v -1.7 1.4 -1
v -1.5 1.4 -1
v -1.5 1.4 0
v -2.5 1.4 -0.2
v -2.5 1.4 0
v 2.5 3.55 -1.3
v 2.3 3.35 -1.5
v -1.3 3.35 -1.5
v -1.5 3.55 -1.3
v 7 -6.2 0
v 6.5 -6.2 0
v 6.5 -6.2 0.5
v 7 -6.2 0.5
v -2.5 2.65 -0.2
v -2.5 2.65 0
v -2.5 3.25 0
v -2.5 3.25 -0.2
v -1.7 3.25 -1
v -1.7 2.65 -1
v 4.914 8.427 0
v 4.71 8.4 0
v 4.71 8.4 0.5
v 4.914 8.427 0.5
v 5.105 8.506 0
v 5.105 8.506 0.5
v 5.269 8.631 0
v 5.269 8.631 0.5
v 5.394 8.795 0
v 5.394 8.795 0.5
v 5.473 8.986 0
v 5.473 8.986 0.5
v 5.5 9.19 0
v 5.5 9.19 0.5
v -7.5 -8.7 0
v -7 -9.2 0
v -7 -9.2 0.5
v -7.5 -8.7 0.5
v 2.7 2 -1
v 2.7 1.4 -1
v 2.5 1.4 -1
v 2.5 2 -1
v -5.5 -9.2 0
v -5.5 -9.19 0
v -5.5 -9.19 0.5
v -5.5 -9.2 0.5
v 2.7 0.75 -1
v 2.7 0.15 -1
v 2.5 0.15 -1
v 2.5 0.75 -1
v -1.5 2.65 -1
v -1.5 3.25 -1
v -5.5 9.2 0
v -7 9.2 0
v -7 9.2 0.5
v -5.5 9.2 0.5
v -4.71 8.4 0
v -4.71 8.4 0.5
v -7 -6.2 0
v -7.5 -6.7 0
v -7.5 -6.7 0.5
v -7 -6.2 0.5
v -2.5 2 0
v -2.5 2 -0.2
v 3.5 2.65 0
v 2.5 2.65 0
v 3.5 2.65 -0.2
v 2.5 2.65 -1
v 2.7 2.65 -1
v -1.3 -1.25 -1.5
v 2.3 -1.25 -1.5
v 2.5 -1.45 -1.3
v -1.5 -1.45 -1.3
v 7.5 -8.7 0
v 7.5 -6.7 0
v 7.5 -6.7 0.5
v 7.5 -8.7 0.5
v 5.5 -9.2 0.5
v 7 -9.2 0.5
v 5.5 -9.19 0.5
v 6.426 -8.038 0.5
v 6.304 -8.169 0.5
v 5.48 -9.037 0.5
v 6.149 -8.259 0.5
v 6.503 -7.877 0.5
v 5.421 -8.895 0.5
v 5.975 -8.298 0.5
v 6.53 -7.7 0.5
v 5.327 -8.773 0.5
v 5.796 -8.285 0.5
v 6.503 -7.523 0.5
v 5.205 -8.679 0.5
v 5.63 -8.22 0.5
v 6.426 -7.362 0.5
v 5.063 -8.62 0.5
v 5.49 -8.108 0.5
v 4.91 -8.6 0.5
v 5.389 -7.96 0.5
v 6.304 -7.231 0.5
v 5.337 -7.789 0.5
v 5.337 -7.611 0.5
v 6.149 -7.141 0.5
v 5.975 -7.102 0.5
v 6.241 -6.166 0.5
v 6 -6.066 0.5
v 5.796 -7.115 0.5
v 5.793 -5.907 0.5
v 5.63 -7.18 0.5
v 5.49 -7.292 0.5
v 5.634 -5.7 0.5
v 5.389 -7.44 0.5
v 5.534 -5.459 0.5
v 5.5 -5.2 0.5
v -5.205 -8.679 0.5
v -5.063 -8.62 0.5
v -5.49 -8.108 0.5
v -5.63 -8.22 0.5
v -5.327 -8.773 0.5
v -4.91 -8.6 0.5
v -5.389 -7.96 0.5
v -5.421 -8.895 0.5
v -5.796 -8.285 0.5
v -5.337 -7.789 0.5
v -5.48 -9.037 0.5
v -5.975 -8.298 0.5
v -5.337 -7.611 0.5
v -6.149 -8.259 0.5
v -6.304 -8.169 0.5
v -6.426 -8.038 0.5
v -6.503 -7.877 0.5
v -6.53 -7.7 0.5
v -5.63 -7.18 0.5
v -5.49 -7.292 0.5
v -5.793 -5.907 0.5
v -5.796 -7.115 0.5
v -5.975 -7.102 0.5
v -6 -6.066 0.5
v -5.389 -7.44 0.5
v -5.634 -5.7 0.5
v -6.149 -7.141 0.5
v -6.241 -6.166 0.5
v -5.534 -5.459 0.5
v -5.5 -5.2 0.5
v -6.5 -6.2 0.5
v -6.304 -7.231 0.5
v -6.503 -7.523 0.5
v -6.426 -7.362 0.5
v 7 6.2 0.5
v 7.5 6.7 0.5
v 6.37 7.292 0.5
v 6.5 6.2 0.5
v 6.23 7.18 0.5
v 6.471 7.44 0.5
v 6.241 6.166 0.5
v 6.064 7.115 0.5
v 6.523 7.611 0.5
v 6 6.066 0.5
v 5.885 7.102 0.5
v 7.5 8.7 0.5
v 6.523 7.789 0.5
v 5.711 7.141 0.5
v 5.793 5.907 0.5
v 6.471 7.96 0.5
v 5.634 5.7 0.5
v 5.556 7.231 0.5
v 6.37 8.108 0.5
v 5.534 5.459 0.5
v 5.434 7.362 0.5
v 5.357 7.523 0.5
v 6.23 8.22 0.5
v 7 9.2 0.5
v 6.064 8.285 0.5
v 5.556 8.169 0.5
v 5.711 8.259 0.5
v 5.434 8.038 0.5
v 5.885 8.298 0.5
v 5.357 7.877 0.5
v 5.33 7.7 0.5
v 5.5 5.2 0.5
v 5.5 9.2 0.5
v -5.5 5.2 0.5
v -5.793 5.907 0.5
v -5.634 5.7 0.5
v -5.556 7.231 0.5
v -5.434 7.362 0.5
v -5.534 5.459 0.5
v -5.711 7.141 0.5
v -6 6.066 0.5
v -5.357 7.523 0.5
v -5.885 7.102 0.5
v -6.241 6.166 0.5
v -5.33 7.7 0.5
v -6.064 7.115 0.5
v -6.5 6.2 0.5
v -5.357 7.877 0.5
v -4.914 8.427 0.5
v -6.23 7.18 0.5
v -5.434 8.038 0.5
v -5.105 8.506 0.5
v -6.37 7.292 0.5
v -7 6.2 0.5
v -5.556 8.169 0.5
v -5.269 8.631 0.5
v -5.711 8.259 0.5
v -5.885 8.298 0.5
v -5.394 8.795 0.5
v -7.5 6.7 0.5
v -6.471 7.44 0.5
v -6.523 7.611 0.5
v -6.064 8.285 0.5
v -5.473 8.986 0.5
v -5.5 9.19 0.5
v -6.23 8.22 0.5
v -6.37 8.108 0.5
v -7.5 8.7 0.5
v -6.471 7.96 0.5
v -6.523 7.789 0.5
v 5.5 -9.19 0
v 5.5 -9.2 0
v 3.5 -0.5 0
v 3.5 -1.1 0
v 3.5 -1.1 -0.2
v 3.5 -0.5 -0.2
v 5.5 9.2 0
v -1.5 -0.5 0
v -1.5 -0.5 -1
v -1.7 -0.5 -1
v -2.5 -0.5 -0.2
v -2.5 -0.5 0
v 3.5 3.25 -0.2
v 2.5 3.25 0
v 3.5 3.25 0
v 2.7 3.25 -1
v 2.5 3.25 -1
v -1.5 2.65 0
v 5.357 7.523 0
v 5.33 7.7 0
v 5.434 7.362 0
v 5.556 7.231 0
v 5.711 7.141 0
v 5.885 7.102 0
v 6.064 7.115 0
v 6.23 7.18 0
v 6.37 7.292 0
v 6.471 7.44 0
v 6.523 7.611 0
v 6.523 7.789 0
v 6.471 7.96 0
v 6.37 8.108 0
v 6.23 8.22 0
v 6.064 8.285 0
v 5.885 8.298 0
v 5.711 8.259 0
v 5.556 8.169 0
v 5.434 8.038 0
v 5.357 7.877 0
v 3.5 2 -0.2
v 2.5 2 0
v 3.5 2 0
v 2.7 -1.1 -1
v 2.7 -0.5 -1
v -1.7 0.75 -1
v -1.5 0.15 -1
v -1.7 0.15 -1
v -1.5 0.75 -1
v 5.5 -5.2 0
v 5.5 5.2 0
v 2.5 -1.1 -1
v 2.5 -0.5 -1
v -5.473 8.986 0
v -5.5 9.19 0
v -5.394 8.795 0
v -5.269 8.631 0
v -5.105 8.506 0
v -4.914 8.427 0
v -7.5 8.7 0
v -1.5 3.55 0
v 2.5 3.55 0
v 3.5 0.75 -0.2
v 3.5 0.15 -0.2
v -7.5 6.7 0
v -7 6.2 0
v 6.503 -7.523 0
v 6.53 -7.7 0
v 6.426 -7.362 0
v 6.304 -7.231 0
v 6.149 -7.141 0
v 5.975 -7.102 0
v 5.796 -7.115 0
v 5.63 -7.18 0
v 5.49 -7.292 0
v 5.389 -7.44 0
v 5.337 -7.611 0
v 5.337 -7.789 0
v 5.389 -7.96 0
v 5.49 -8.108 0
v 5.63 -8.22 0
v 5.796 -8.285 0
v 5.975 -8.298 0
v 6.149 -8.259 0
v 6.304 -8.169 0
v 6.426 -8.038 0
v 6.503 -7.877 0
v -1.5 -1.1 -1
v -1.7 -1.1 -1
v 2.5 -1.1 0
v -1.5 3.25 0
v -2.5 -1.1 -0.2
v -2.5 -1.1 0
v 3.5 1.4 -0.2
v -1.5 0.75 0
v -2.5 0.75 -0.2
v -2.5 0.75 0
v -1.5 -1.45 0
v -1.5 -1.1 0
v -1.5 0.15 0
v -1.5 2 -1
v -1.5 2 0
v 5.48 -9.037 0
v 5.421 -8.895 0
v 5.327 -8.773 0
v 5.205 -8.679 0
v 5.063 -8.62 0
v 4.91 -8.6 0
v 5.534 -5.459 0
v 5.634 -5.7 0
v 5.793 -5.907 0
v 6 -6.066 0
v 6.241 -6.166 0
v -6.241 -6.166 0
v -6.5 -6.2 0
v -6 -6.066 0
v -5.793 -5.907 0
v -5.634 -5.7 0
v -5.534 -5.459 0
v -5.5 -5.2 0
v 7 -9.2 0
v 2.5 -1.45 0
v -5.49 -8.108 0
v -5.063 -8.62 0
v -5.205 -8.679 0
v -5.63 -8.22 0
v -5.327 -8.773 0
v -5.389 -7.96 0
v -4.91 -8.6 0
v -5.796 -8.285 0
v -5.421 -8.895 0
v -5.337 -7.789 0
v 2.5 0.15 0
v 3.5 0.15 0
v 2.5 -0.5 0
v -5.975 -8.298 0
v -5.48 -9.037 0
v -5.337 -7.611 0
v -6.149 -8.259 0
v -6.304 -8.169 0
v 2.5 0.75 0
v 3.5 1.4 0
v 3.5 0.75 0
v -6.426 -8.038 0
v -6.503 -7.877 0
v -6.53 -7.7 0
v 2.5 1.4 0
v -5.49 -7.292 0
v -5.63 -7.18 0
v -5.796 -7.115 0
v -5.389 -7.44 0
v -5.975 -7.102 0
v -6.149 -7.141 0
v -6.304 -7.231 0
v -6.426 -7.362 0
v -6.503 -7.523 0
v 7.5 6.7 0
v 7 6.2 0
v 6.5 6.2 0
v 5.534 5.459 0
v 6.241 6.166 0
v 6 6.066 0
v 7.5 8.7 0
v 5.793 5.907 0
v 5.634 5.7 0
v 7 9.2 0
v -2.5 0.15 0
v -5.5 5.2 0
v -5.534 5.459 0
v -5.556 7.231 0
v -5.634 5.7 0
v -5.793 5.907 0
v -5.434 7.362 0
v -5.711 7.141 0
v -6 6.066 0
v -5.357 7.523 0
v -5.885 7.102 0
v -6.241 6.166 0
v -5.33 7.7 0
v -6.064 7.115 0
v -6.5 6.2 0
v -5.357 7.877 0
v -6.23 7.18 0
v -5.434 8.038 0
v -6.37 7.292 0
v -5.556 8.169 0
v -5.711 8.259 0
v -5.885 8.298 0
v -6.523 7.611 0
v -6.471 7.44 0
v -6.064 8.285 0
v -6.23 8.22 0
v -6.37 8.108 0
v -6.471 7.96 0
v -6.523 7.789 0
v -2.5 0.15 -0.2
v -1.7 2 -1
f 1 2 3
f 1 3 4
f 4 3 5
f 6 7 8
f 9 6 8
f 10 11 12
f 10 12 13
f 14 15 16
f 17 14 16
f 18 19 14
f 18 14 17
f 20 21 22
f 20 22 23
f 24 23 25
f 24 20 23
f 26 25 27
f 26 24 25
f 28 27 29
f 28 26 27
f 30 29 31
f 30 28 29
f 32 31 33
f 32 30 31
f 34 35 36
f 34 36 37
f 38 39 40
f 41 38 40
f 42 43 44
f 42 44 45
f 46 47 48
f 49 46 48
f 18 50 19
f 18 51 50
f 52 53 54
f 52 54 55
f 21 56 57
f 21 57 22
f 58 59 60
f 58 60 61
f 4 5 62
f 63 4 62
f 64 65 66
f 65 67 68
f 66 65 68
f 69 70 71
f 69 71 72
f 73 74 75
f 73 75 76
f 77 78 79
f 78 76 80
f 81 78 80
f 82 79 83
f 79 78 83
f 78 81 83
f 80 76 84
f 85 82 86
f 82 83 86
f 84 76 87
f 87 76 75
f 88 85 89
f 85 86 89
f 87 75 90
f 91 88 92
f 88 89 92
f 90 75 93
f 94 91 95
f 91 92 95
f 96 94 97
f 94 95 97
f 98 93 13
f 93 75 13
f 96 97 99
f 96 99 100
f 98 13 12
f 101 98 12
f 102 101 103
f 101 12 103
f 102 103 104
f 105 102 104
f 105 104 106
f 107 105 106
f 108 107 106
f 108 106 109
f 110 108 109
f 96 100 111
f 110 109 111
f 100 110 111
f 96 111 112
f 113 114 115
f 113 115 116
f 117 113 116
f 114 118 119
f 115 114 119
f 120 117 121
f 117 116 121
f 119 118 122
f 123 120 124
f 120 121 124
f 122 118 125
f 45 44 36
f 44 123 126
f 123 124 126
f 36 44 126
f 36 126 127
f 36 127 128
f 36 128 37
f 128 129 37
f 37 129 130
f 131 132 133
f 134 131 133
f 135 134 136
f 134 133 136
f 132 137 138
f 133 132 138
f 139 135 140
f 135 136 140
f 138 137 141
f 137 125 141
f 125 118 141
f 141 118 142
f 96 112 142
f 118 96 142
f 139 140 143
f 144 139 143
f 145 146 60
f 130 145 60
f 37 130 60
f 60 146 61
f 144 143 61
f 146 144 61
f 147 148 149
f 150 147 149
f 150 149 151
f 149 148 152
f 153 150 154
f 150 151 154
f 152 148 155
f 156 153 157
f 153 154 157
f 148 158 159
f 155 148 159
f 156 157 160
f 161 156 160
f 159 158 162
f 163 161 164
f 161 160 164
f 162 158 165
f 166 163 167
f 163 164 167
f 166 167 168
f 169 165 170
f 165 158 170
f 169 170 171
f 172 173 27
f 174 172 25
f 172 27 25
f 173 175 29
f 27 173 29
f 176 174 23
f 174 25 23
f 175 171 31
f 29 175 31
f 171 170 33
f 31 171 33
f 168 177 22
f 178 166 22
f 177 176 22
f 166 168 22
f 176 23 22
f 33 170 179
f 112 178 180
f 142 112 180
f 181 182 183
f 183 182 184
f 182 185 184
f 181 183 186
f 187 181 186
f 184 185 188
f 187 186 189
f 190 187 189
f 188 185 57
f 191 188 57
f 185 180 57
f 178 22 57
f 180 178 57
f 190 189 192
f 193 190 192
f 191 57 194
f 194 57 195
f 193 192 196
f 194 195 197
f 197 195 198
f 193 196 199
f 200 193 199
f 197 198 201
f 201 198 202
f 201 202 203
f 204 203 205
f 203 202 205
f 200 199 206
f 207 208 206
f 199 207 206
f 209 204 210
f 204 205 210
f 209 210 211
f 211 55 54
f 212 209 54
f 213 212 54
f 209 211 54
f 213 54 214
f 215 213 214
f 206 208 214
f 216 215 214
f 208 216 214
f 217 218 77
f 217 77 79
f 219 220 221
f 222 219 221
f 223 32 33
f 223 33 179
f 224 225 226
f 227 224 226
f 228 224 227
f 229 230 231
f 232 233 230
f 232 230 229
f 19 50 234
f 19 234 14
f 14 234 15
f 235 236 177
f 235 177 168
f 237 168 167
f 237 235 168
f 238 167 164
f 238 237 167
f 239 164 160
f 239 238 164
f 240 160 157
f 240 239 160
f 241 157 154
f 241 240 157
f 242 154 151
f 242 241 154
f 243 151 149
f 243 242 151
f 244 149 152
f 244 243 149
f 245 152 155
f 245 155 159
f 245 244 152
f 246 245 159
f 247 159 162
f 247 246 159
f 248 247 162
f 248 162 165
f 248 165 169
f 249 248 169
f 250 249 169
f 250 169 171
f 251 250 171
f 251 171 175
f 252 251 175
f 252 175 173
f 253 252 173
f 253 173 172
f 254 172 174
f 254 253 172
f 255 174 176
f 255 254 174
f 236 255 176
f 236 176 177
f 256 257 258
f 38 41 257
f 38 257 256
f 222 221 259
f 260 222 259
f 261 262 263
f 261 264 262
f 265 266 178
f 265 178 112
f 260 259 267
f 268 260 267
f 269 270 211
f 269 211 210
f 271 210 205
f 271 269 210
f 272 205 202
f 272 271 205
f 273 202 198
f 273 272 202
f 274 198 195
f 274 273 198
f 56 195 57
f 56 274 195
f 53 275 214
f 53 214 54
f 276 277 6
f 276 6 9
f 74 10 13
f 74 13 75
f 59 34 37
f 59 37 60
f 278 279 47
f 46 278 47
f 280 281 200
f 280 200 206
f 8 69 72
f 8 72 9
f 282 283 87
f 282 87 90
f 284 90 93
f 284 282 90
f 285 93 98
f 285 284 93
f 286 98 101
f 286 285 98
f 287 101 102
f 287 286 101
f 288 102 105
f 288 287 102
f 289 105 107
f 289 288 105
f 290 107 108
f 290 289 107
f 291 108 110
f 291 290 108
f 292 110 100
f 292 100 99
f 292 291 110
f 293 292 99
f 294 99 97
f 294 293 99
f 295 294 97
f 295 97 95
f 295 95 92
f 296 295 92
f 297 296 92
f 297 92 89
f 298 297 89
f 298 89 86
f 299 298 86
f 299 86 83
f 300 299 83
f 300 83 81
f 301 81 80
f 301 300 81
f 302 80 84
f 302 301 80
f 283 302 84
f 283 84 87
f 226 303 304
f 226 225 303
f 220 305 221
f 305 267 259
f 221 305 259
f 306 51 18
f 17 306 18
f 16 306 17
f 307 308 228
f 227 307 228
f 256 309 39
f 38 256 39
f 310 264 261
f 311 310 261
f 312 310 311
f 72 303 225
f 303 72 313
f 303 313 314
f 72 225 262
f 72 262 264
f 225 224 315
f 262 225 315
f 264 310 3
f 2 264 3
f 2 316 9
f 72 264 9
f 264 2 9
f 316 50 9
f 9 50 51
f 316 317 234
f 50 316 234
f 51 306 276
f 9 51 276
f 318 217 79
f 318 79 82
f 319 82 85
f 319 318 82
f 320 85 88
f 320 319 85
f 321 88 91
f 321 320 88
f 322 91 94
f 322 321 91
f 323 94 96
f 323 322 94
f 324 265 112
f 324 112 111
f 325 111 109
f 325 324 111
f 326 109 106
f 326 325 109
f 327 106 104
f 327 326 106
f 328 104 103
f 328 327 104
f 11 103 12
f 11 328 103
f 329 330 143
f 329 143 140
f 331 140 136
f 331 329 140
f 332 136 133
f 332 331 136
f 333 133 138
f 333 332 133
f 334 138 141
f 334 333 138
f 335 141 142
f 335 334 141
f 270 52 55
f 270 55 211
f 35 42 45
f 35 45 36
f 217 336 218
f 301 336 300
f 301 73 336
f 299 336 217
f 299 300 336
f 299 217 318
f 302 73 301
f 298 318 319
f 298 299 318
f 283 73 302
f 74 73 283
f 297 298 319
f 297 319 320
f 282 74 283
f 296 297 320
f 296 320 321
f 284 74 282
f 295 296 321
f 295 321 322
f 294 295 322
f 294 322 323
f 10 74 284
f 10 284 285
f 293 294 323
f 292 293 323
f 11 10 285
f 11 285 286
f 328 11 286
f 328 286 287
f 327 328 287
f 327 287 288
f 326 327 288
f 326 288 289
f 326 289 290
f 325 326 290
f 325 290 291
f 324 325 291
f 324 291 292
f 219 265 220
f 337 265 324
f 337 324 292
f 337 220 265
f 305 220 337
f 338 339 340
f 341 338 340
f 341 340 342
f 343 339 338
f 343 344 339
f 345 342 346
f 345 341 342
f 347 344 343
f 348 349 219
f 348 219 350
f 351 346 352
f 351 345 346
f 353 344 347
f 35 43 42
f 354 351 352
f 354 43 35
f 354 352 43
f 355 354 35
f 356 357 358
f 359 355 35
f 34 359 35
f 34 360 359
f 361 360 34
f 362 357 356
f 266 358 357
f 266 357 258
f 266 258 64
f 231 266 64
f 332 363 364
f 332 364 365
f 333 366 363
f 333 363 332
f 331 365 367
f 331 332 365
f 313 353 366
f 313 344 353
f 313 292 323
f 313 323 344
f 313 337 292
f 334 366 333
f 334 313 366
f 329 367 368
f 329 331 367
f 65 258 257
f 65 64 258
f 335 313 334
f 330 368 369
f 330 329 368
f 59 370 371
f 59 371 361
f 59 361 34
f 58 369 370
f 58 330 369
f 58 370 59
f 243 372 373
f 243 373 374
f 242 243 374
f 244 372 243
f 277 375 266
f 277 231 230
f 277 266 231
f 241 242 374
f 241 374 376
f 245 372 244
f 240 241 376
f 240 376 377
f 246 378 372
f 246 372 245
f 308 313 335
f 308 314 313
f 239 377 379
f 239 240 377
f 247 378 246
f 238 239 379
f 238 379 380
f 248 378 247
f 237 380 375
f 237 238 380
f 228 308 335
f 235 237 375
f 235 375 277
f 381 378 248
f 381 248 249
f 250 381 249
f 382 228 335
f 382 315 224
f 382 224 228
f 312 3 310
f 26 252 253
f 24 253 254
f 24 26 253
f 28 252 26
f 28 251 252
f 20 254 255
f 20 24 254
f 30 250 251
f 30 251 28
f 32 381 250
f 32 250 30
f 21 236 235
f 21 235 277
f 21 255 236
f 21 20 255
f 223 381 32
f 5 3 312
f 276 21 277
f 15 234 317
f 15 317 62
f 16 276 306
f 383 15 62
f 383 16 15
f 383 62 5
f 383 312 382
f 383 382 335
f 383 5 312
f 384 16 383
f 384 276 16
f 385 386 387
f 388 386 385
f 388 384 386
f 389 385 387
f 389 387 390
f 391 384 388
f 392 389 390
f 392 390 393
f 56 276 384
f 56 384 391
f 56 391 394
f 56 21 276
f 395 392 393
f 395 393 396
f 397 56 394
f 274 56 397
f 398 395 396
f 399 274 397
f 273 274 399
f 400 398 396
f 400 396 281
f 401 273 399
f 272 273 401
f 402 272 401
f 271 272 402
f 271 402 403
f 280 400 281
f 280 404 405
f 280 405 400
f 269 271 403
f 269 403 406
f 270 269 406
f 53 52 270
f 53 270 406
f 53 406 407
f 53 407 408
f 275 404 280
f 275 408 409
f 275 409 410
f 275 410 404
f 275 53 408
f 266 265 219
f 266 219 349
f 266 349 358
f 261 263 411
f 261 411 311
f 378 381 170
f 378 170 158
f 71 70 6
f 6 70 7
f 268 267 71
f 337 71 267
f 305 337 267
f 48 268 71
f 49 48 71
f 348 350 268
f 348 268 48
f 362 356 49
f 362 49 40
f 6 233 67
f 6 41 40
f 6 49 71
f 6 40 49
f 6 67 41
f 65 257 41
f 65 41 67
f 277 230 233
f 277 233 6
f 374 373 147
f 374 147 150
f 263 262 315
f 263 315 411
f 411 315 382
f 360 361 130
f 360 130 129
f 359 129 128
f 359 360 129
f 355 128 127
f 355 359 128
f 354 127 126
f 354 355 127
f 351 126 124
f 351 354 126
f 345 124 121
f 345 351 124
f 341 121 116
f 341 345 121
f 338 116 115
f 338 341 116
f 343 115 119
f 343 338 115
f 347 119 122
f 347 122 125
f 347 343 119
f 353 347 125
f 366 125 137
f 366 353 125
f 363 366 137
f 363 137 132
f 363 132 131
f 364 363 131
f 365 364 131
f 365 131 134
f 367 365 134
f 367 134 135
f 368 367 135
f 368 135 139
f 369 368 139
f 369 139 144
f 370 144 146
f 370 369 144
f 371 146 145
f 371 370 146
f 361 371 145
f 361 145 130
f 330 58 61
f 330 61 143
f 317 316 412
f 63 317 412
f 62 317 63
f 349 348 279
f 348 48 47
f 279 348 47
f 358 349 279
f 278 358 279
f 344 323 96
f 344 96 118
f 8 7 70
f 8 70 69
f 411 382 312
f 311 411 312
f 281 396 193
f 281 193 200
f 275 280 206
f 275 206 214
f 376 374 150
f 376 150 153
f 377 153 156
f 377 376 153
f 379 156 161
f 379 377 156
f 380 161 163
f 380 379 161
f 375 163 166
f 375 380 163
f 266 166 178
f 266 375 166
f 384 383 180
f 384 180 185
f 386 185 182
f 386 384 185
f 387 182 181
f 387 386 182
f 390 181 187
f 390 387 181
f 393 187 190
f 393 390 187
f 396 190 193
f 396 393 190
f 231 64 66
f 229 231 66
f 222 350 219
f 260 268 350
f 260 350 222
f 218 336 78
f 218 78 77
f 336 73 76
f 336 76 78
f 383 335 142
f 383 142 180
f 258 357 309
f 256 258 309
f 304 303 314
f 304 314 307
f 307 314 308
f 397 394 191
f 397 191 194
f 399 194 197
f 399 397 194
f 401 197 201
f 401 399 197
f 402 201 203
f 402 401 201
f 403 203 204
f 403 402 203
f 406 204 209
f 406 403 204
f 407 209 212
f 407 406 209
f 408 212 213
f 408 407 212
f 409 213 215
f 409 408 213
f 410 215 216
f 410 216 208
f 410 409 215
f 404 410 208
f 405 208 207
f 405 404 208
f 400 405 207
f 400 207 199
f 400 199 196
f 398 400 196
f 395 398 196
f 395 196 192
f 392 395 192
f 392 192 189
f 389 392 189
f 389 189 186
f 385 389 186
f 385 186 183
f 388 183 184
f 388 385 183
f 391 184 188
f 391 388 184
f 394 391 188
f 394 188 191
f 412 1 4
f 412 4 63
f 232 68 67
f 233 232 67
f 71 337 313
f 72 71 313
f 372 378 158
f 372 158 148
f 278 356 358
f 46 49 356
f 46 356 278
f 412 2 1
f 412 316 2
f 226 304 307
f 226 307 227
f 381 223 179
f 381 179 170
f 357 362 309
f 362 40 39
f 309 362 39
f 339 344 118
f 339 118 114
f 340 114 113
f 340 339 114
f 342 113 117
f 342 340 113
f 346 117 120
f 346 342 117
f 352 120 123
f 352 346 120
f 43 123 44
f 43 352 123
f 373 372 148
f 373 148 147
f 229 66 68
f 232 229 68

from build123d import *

# Parameters (mm, degrees)
ESBO_O1_R                       = 0.6
RESSALTO_EXTRUS_O1_DEPTH        = 0.5
ESBO_O3_W                       = 4
ESBO_O3_H                       = 5
RESSALTO_EXTRUS_O2_DEPTH        = 1.5
ESBO_O4_W                       = 1
ESBO_O4_H                       = 0.6
RESSALTO_EXTRUS_O3_DEPTH        = 1
CHANFRO1_SIZE                   = 0.8
PADR_O_LINEAR1_COUNT            = 4
PADR_O_LINEAR1_PITCH            = 1.25
CHANFRO1_OF_PADR_O_LINEAR1_SIZE = 0.8
ESPELHAR1_START                 = -1.1
ESPELHAR1_DEPTH                 = 0.6
ESPELHAR1_START_2               = 0.15
ESPELHAR1_2_DEPTH               = 0.6
ESPELHAR1_START_3               = 1.4
ESPELHAR1_3_DEPTH               = 0.6
ESPELHAR1_START_4               = 2.65
ESPELHAR1_4_DEPTH               = 0.6
CHANFRO2_SIZE                   = 0.2


# Read off the part's stored shape, not the designer's step: Espelhar1
with BuildPart() as part:
    # Esboço1 → Ressalto-extrusão1 (new body)
    with BuildSketch(Plane.XY):
        with BuildLine():
            Line((-7, 9.2), (-5.5, 9.2))
            Line((-5.5, 9.2), (-5.5, 9.19))
            ThreePointArc((-5.5, 9.19), (-5.268614357, 8.631385643), (-4.71, 8.4))
            Line((-4.71, 8.4), (4.71, 8.4))
            ThreePointArc((4.71, 8.4), (5.268614357, 8.631385643), (5.5, 9.19))
            Line((5.5, 9.19), (5.5, 9.2))
            Line((5.5, 9.2), (7, 9.2))
            Line((7, 9.2), (7.5, 8.7))
            Line((7.5, 8.7), (7.5, 6.7))
            Line((7.5, 6.7), (7, 6.2))
            Line((7, 6.2), (6.5, 6.2))
            ThreePointArc((6.5, 6.2), (5.792893219, 5.907106781), (5.5, 5.2))
            Line((5.5, 5.2), (5.5, -5.2))
            ThreePointArc((5.5, -5.2), (5.792893219, -5.907106781), (6.5, -6.2))
            Line((6.5, -6.2), (7, -6.2))
            Line((7, -6.2), (7.5, -6.7))
            Line((7.5, -6.7), (7.5, -8.7))
            Line((7.5, -8.7), (7, -9.2))
            Line((7, -9.2), (5.5, -9.2))
            Line((5.5, -9.2), (5.5, -9.19))
            ThreePointArc((5.5, -9.19), (5.327193001, -8.772806999), (4.91, -8.6))
            Line((4.91, -8.6), (-4.91, -8.6))
            ThreePointArc((-4.91, -8.6), (-5.327193001, -8.772806999), (-5.5, -9.19))
            Line((-5.5, -9.19), (-5.5, -9.2))
            Line((-5.5, -9.2), (-7, -9.2))
            Line((-7, -9.2), (-7.5, -8.7))
            Line((-7.5, -8.7), (-7.5, -6.7))
            Line((-7.5, -6.7), (-7, -6.2))
            Line((-7, -6.2), (-6.5, -6.2))
            ThreePointArc((-6.5, -6.2), (-5.792893219, -5.907106781), (-5.5, -5.2))
            Line((-5.5, -5.2), (-5.5, 5.2))
            ThreePointArc((-5.5, 5.2), (-5.792893219, 5.907106781), (-6.5, 6.2))
            Line((-6.5, 6.2), (-7, 6.2))
            Line((-7, 6.2), (-7.5, 6.7))
            Line((-7.5, 6.7), (-7.5, 8.7))
            Line((-7.5, 8.7), (-7, 9.2))
        make_face()
        with Locations((-5.93, 7.7)):
            Circle(ESBO_O1_R, mode=Mode.SUBTRACT)
        with Locations(Location((5.93, 7.7, 0), (0, 0, 180))):
            Circle(ESBO_O1_R, mode=Mode.SUBTRACT)
        with Locations(Location((-5.93, -7.7, 0), (0, 0, 180))):
            Circle(ESBO_O1_R, mode=Mode.SUBTRACT)
        with Locations((5.93, -7.7)):
            Circle(ESBO_O1_R, mode=Mode.SUBTRACT)
    extrude(amount=RESSALTO_EXTRUS_O1_DEPTH)

    # Esboço3 → Ressalto-extrusão2 (add)
    with BuildSketch(Plane(origin=(0, 0, 0), x_dir=(-1, 0, 0), z_dir=(0, 0, -1))):
        with Locations((-0.5, 1.05)):
            Rectangle(ESBO_O3_W, ESBO_O3_H)
    extrude(amount=RESSALTO_EXTRUS_O2_DEPTH)

    # Esboço4 → Ressalto-extrusão3 (add)
    with BuildSketch(Plane(origin=(0, 0, 0), x_dir=(-1, 0, 0), z_dir=(0, 0, -1))):
        with Locations((2, 2.95)):
            Rectangle(ESBO_O4_W, ESBO_O4_H)
    ressalto_extrus_o3 = extrude(amount=RESSALTO_EXTRUS_O3_DEPTH)

    # Chanfro1
    chanfro1_edges = [part.edges().sort_by_distance(p)[0] for p in [
        (-2.5, 2.95, -1),
    ]]
    chamfer(chanfro1_edges, length=CHANFRO1_SIZE)

    # Padrão linear1: Ressalto-extrusão3 ×4
    with Locations(*[(0, -i * PADR_O_LINEAR1_PITCH, 0) for i in range(1, PADR_O_LINEAR1_COUNT)]):
        add(ressalto_extrus_o3)

    # Chanfro1 of Padrão linear1
    chanfro1_of_padr_o_linear1_edges = [part.edges().sort_by_distance(p)[0] for p in [
        (-2.5, 1.7, -1),
        (-2.5, 0.45, -1),
        (-2.5, -0.8, -1),
    ]]
    chamfer(chanfro1_of_padr_o_linear1_edges, length=CHANFRO1_OF_PADR_O_LINEAR1_SIZE)

    # Espelhar1 outline → Espelhar1 (add)
    with BuildSketch(Plane(origin=(0, 0, 0), x_dir=(1, 0, 0), z_dir=(0, 1, 0)).offset(ESPELHAR1_START)):
        Polygon((3.5, 0.2), (2.7, 1), (2.5, 1), (2.5, 0), (3.5, 0), align=None)
    extrude(amount=ESPELHAR1_DEPTH)

    # Espelhar1 2 outline → Espelhar1 2 (add)
    with BuildSketch(Plane(origin=(0, 0, 0), x_dir=(1, 0, 0), z_dir=(0, 1, 0)).offset(ESPELHAR1_START_2)):
        Polygon((3.5, 0.2), (2.7, 1), (2.5, 1), (2.5, 0), (3.5, 0), align=None)
    extrude(amount=ESPELHAR1_2_DEPTH)

    # Espelhar1 3 outline → Espelhar1 3 (add)
    with BuildSketch(Plane(origin=(0, 0, 0), x_dir=(1, 0, 0), z_dir=(0, 1, 0)).offset(ESPELHAR1_START_3)):
        Polygon((3.5, 0.2), (2.7, 1), (2.5, 1), (2.5, 0), (3.5, 0), align=None)
    extrude(amount=ESPELHAR1_3_DEPTH)

    # Espelhar1 4 outline → Espelhar1 4 (add)
    with BuildSketch(Plane(origin=(0, 0, 0), x_dir=(1, 0, 0), z_dir=(0, 1, 0)).offset(ESPELHAR1_START_4)):
        Polygon((3.5, 0.2), (2.7, 1), (2.5, 1), (2.5, 0), (3.5, 0), align=None)
    extrude(amount=ESPELHAR1_4_DEPTH)

    # Chanfro2
    chanfro2_edges = [part.edges().sort_by_distance(p)[0] for p in [
        (2.5, 1.05, -1.5),
        (0.5, -1.45, -1.5),
        (-1.5, 1.05, -1.5),
        (0.5, 3.55, -1.5),
    ]]
    chamfer(chanfro2_edges, length=CHANFRO2_SIZE)


solid = part.part
